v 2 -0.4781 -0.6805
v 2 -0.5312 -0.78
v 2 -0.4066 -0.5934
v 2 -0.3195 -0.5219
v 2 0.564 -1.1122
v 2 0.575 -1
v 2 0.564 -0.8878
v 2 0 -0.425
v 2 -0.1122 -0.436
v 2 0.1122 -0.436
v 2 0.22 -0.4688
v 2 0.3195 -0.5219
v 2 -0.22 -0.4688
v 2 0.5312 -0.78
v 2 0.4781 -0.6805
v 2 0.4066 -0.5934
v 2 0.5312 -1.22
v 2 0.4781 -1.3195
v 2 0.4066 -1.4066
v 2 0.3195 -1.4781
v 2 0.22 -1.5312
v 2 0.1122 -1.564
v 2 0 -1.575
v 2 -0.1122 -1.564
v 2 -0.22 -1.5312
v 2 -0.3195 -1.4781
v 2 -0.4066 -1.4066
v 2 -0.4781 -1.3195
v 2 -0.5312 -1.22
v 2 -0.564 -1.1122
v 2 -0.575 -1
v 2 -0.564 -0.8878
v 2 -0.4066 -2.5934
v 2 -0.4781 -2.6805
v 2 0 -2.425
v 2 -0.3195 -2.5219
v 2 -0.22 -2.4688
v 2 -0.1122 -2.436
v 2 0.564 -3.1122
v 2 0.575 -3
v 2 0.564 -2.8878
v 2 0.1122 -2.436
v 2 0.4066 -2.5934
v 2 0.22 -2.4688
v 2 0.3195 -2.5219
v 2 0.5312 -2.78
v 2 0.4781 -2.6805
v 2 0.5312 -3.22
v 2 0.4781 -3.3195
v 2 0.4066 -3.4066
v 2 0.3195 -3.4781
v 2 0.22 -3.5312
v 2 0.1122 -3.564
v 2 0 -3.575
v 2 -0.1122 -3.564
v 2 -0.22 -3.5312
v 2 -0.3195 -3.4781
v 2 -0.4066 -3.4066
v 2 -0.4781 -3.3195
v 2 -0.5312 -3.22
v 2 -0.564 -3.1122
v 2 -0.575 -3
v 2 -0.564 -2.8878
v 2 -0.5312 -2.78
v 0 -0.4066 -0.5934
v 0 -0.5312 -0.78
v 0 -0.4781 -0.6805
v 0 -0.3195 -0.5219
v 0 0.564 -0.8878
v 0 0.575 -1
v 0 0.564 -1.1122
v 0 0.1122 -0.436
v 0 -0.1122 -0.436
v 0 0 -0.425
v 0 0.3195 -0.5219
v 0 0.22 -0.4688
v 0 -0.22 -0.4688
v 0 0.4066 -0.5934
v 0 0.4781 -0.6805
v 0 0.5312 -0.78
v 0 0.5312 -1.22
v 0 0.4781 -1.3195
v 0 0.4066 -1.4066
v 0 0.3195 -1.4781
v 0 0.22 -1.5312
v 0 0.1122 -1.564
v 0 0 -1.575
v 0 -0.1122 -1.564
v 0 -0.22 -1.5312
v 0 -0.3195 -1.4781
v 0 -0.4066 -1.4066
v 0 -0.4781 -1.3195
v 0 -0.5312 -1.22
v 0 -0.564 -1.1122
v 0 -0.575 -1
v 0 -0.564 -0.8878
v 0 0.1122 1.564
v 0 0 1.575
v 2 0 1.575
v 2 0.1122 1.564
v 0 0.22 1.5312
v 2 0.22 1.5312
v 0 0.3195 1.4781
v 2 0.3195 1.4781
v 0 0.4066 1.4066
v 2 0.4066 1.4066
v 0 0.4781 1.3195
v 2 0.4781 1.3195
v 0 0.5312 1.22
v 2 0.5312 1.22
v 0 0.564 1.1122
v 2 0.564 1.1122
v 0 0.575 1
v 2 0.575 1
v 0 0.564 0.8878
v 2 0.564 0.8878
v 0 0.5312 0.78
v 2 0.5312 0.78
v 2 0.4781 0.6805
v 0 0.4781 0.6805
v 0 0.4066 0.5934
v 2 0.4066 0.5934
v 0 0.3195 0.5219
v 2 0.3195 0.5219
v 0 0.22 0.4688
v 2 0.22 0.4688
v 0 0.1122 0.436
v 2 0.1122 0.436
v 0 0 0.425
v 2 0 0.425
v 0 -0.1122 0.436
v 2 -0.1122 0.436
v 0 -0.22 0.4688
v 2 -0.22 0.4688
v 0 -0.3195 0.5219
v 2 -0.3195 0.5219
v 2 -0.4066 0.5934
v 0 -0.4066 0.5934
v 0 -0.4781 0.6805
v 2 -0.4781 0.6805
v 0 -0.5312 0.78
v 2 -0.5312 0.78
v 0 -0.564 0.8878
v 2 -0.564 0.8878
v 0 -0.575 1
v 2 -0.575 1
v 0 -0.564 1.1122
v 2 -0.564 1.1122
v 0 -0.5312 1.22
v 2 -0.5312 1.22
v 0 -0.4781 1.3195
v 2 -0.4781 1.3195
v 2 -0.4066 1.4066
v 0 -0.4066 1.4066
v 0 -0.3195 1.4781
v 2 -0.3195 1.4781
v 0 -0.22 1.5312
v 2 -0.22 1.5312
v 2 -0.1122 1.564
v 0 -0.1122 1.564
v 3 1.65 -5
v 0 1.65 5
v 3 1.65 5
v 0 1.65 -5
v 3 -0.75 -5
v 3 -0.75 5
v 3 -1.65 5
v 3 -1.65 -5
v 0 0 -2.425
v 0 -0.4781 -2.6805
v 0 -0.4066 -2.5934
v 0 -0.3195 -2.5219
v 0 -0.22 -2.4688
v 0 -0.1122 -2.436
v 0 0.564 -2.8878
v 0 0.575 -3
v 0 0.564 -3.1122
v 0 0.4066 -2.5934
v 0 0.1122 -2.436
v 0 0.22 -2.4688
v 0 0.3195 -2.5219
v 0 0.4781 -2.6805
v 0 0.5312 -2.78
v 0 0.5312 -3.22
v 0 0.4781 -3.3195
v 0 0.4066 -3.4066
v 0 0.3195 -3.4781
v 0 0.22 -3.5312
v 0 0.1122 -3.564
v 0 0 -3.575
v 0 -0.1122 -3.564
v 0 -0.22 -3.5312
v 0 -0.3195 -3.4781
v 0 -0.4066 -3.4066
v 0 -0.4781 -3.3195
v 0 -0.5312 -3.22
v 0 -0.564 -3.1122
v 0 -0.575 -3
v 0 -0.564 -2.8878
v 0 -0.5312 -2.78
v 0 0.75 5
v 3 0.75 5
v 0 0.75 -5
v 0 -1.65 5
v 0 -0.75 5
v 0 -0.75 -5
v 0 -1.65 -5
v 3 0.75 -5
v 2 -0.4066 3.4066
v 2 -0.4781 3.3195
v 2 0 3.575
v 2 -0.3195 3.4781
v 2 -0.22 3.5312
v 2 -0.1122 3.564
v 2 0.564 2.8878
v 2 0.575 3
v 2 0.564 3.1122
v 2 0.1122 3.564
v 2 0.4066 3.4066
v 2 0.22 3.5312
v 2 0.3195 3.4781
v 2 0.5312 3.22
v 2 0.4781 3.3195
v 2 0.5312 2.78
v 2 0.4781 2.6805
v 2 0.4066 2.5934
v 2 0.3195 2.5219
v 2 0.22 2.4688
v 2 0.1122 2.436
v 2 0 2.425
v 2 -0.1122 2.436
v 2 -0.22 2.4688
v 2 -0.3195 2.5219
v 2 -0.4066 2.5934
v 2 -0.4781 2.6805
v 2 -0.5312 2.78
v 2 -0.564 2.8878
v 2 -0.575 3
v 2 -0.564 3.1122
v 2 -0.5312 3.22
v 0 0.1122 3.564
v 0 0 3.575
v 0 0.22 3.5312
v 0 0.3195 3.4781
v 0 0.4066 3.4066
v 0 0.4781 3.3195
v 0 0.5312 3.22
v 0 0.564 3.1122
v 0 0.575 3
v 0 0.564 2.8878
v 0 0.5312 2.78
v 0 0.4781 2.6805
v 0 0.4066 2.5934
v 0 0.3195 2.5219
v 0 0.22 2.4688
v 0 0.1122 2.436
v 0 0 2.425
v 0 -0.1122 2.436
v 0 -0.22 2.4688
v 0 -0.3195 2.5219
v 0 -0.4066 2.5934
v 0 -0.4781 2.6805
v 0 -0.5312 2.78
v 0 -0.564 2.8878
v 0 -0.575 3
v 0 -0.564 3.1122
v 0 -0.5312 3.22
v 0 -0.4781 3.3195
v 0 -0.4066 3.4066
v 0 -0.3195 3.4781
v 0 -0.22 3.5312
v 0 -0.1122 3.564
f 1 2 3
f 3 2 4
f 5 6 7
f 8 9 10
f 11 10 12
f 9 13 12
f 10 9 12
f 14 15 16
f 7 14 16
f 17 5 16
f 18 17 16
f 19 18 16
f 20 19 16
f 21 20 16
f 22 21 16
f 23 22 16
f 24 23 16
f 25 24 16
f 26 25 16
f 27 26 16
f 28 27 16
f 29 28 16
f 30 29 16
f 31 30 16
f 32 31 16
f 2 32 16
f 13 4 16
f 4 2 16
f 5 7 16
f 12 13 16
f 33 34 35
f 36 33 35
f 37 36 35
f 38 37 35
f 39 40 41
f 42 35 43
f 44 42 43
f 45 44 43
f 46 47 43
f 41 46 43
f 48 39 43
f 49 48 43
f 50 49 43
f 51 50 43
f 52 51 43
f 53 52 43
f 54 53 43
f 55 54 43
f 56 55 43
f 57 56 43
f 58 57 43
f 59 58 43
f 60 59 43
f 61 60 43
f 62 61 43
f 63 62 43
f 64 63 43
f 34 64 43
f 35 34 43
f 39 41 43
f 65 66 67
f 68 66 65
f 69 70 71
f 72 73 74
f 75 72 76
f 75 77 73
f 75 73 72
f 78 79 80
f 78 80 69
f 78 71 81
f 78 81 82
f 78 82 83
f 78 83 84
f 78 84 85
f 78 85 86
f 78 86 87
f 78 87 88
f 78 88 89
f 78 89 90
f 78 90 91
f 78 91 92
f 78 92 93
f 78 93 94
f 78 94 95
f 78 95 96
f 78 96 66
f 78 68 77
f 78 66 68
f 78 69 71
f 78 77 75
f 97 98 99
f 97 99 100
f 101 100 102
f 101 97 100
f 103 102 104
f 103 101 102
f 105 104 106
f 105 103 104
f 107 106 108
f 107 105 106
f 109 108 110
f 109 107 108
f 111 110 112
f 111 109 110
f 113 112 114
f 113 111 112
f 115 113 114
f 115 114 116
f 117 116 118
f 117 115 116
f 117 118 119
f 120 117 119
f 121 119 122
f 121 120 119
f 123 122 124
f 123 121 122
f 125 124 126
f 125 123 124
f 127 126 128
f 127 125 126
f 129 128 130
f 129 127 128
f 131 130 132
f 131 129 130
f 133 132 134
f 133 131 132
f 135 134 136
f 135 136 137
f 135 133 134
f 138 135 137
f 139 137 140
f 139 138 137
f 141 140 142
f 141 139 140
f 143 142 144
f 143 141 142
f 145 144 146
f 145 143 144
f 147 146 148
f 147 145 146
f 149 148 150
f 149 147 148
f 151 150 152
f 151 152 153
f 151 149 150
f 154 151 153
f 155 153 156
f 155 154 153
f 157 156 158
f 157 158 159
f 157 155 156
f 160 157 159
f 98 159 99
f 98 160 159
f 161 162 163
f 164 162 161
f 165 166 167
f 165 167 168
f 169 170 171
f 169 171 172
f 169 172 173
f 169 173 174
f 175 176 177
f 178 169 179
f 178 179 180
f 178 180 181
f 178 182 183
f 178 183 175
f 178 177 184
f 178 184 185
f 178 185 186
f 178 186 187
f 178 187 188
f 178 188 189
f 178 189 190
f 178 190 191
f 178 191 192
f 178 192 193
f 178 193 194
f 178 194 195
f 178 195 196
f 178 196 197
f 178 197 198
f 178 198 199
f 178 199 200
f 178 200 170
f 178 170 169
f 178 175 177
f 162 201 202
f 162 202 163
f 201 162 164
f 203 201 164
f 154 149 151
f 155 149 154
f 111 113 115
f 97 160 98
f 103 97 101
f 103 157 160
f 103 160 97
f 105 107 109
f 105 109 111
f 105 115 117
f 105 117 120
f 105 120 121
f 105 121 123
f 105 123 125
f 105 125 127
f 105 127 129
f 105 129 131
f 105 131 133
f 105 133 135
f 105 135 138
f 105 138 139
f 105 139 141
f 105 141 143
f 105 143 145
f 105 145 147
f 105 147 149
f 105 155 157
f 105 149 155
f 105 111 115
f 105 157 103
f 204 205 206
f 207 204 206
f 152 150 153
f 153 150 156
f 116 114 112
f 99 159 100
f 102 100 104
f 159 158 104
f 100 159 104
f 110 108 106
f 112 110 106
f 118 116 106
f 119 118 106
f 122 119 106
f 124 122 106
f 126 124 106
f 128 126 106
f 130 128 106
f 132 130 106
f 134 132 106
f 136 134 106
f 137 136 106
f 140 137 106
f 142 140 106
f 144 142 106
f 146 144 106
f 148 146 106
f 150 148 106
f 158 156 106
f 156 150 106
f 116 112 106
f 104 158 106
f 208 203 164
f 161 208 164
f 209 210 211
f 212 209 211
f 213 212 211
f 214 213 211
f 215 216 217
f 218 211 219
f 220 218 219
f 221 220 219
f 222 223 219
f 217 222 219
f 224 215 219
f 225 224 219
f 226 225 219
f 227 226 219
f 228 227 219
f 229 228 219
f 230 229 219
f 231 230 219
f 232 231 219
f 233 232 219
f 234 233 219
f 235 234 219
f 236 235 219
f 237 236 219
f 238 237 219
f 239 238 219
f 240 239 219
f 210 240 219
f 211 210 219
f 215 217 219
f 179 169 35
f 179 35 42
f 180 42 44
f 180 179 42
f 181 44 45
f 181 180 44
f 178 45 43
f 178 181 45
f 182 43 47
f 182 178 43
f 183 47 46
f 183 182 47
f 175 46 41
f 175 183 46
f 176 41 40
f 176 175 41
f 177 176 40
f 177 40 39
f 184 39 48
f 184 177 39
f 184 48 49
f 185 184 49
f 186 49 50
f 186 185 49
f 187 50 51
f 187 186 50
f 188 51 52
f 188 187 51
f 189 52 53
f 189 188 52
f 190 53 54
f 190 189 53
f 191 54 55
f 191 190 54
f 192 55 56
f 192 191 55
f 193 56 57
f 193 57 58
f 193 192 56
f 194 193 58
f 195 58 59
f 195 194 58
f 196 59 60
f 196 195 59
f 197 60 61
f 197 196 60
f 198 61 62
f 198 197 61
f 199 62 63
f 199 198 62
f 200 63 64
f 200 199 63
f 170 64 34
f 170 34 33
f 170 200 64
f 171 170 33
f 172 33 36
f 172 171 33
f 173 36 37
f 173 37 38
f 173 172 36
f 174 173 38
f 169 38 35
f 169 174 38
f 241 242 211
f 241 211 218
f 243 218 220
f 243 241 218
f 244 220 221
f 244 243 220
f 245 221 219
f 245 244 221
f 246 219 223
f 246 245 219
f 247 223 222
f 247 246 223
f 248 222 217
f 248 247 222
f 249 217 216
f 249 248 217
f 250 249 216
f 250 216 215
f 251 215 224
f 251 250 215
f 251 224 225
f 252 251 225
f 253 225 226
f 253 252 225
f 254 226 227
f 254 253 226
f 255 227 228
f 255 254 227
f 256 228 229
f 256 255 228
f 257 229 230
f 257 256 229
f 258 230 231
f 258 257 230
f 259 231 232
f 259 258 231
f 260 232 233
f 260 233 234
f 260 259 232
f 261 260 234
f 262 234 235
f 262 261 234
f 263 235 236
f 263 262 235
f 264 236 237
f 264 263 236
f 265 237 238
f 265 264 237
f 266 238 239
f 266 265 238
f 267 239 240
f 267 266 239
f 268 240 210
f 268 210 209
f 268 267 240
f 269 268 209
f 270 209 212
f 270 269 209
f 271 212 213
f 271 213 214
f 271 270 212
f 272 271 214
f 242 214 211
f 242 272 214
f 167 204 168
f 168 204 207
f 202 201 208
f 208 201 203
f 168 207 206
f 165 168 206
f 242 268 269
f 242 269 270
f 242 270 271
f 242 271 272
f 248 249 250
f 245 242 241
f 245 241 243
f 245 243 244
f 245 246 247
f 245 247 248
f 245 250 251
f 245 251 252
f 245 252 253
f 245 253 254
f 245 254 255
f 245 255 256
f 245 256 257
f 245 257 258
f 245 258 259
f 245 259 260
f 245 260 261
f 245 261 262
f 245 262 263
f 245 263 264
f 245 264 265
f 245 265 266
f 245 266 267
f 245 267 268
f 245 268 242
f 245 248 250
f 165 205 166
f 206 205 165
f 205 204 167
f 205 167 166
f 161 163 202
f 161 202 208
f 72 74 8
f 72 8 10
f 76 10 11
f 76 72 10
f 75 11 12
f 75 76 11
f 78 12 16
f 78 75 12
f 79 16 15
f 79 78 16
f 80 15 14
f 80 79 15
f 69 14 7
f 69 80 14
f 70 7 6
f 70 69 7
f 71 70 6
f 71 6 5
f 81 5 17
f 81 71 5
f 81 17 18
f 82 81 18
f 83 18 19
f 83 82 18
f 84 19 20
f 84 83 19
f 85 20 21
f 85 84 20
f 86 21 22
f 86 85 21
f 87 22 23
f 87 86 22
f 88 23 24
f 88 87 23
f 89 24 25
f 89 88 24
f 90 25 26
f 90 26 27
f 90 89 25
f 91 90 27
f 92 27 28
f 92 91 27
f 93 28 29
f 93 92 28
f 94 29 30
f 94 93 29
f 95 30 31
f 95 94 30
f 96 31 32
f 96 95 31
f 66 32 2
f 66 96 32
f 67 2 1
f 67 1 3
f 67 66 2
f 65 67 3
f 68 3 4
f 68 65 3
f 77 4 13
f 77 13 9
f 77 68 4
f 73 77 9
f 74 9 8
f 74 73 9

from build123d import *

# Parameters (mm, degrees)
SKETCH1_W             = 10
SKETCH1_H             = 0.9
BOSS_EXTRUDE1_DEPTH   = 3
BOSS_EXTRUDE1_2_DEPTH = 3
SKETCH2_R             = 0.575
BOSS_EXTRUDE2_DEPTH   = 2
BOSS_EXTRUDE2_2_DEPTH = 2
BOSS_EXTRUDE2_3_DEPTH = 2
BOSS_EXTRUDE2_4_DEPTH = 2


with BuildPart() as part:
    # Sketch1 → Boss-Extrude1 (new body)
    with BuildSketch(Plane(origin=(0, 0, 0), x_dir=(0, 0, -1), z_dir=(1, 0, 0))):
        with Locations((0, 1.2)):
            Rectangle(SKETCH1_W, SKETCH1_H)
    extrude(amount=BOSS_EXTRUDE1_DEPTH)


with BuildPart() as body_2:
    # Sketch1 → Boss-Extrude1 2 (new body)
    with BuildSketch(Plane(origin=(0, 0, 0), x_dir=(0, 0, -1), z_dir=(1, 0, 0))):
        with Locations((0, -1.2)):
            Rectangle(SKETCH1_W, SKETCH1_H)
    extrude(amount=BOSS_EXTRUDE1_2_DEPTH)


with BuildPart() as body_3:
    # Sketch2 → Boss-Extrude2 (new body)
    with BuildSketch(Plane.ZY):
        with Locations((-3, 0)):
            Circle(SKETCH2_R)
    extrude(amount=-BOSS_EXTRUDE2_DEPTH)


with BuildPart() as body_4:
    # Sketch2 → Boss-Extrude2 2 (new body)
    with BuildSketch(Plane.ZY):
        with Locations((-1, 0)):
            Circle(SKETCH2_R)
    extrude(amount=-BOSS_EXTRUDE2_2_DEPTH)


with BuildPart() as body_5:
    # Sketch2 → Boss-Extrude2 3 (new body)
    with BuildSketch(Plane.ZY):
        with Locations((1, 0)):
            Circle(SKETCH2_R)
    extrude(amount=-BOSS_EXTRUDE2_3_DEPTH)


with BuildPart() as body_6:
    # Sketch2 → Boss-Extrude2 4 (new body)
    with BuildSketch(Plane.ZY):
        with Locations((3, 0)):
            Circle(SKETCH2_R)
    extrude(amount=-BOSS_EXTRUDE2_4_DEPTH)


solid = Compound([part.part, body_2.part, body_3.part, body_4.part, body_5.part, body_6.part])
